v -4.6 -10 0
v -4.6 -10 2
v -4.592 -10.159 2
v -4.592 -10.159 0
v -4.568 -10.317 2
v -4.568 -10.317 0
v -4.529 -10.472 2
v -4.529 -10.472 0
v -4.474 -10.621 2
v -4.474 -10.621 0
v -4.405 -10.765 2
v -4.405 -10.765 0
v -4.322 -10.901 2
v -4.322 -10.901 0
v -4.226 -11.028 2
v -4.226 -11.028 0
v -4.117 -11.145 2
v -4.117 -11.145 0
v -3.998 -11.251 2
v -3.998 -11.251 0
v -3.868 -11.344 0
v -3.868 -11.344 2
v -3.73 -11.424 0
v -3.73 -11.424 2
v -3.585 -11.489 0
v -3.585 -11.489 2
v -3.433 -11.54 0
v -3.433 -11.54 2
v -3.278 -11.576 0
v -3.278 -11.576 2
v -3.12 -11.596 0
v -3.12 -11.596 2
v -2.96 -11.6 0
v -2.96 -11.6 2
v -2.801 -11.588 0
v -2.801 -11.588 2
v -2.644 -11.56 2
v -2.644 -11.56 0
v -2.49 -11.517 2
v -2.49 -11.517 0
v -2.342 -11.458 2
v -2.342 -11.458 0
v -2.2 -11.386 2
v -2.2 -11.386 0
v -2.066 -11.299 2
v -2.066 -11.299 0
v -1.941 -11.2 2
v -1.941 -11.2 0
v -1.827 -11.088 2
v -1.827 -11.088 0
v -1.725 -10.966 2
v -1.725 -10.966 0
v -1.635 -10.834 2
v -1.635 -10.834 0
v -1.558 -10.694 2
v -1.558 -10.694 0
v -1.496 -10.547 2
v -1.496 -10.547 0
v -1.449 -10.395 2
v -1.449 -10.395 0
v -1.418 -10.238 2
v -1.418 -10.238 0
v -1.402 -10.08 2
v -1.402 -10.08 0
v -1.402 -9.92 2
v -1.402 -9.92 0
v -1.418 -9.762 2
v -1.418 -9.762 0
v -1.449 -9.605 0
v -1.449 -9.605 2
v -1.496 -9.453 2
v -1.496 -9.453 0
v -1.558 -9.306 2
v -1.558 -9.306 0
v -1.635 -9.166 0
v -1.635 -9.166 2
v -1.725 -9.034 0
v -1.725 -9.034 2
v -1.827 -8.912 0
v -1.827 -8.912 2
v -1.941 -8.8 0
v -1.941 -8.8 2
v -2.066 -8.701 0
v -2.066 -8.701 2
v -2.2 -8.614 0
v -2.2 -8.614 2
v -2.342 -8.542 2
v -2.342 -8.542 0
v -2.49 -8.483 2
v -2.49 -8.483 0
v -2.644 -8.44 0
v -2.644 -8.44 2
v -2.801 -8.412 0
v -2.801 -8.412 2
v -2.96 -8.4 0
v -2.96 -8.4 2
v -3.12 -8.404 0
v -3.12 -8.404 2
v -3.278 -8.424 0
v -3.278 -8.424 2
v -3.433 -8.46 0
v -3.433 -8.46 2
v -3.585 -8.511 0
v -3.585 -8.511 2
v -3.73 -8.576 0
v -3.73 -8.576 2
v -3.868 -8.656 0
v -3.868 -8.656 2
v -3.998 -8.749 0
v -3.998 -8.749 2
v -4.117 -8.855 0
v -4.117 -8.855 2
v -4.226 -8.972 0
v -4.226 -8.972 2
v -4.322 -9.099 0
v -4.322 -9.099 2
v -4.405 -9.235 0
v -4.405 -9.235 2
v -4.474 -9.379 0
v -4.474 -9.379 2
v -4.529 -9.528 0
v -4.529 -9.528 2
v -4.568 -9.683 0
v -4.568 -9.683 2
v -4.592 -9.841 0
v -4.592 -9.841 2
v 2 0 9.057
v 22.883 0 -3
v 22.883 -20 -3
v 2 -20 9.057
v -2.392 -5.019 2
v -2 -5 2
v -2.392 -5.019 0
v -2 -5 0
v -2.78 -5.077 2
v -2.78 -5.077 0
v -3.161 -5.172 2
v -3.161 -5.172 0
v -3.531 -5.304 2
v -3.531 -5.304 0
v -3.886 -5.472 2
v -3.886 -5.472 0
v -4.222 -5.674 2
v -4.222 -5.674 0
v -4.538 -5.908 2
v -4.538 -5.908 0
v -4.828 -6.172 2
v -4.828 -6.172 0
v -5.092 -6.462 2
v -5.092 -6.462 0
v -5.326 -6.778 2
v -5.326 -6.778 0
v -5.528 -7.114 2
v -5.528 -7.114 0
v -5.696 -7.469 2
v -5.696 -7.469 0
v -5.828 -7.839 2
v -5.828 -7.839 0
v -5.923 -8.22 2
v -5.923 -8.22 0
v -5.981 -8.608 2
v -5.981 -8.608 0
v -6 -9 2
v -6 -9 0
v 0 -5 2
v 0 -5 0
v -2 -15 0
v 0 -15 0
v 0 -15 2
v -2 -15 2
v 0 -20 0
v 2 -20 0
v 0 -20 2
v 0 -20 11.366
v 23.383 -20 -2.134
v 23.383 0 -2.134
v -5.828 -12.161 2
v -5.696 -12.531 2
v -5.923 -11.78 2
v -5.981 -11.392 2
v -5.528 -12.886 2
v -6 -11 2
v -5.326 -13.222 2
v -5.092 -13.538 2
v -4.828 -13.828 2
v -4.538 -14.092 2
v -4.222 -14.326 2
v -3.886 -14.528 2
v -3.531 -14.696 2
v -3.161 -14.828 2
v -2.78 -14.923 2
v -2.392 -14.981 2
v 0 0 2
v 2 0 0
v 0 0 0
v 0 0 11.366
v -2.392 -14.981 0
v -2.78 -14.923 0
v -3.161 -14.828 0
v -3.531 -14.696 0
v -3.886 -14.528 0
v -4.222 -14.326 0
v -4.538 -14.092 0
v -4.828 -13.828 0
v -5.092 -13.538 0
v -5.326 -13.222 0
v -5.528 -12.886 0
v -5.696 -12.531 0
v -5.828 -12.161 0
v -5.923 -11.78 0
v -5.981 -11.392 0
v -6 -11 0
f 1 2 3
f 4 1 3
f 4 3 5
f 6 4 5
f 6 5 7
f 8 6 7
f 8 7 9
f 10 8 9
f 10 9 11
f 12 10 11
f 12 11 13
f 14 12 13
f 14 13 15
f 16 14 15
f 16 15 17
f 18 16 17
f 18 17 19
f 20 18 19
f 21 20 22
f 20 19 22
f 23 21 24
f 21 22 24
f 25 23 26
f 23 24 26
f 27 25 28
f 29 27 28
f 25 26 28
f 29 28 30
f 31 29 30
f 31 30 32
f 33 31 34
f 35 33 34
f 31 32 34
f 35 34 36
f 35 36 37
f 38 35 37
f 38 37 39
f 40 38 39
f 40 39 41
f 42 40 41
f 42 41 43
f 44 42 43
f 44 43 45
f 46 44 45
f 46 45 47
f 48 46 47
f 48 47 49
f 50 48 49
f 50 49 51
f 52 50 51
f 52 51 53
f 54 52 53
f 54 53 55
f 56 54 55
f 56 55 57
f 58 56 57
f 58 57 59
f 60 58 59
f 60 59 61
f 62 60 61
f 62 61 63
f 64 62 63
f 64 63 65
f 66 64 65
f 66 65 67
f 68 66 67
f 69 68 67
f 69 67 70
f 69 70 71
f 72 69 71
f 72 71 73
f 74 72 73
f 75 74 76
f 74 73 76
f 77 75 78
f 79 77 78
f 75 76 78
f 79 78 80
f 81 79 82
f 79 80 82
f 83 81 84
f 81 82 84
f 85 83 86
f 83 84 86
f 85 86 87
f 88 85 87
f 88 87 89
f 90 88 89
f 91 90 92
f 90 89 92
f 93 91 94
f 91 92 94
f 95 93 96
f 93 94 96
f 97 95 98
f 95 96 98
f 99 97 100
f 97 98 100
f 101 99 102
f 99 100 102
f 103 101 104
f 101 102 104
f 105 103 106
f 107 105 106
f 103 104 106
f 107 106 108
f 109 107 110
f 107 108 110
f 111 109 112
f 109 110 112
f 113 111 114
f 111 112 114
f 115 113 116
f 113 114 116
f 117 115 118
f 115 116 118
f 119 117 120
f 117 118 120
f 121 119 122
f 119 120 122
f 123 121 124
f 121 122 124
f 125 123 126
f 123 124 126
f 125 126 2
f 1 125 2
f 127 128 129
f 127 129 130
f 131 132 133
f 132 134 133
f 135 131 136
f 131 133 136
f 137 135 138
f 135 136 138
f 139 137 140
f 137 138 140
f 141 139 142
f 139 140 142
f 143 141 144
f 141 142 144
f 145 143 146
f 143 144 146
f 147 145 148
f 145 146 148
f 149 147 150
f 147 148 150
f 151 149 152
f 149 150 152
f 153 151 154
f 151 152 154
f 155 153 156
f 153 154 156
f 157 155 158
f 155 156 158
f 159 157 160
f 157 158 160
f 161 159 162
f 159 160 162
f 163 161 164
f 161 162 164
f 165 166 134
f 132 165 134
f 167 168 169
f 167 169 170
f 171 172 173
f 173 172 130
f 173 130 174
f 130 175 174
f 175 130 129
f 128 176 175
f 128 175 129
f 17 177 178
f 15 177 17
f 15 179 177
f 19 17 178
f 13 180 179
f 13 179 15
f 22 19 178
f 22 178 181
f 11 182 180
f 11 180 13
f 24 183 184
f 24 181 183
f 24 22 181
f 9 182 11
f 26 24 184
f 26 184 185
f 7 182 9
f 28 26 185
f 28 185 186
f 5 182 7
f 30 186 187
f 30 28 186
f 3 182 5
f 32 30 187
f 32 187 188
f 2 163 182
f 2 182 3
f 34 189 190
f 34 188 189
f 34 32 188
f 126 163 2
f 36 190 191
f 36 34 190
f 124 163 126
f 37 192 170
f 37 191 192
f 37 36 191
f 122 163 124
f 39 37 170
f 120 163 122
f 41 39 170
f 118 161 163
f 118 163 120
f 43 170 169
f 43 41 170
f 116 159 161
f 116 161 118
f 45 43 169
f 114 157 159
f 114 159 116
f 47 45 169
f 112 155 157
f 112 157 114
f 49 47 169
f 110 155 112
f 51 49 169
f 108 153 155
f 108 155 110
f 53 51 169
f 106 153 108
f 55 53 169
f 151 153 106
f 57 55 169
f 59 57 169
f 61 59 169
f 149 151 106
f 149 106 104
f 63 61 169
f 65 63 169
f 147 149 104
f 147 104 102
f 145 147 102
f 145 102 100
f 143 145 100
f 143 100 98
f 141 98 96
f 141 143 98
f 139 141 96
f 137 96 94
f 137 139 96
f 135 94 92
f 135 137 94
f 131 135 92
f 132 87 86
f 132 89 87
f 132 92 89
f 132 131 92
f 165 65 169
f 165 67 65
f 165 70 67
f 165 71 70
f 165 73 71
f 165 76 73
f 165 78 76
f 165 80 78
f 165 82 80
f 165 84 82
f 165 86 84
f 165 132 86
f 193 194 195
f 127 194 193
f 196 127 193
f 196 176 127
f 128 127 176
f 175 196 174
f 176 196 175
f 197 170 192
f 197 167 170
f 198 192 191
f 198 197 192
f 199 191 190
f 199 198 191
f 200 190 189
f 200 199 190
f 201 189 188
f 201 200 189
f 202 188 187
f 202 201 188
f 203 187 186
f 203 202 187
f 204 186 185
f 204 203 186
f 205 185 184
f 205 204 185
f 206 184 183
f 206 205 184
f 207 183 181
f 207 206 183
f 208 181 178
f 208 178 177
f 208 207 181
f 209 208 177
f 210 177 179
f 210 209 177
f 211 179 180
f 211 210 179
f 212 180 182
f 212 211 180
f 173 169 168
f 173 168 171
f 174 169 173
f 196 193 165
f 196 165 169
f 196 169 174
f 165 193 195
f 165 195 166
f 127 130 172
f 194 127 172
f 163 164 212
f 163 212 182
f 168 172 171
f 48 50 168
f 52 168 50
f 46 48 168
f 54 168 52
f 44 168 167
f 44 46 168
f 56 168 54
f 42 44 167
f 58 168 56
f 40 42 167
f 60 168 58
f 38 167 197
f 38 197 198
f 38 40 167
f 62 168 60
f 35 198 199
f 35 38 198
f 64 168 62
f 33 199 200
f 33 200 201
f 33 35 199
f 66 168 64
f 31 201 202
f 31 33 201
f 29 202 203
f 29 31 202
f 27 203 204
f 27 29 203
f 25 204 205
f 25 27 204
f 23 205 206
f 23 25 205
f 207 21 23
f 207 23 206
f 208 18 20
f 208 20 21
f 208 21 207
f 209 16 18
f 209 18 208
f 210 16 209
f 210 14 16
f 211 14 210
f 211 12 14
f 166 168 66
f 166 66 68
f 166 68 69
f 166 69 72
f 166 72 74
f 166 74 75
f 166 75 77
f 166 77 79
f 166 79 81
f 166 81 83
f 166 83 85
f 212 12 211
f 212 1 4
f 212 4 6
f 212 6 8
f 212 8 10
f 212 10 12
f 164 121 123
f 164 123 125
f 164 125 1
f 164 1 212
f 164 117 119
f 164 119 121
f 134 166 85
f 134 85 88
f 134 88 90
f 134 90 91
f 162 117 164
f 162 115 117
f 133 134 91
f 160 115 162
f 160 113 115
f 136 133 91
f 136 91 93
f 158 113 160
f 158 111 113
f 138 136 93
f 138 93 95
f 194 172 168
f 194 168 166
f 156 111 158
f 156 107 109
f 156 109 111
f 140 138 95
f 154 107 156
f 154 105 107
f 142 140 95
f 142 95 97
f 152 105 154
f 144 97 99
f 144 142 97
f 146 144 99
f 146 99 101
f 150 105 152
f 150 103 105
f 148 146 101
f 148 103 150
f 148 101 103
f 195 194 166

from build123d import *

# Parameters (mm, degrees)
PAD_DEPTH     = 20
SKETCH001_R   = 1.6
SKETCH001_W   = 8.873669
SKETCH001_H   = 5
SKETCH001_W_2 = 10.362093
POCKET_DEPTH  = 5
FILLET_R      = 4


with BuildPart() as part:
    # Sketch → Pad (new body)
    with BuildSketch(Plane.XZ):
        Polygon((0, 11.366025), (23.382686, -2.133975), (22.882686, -3), (2, 9.056624), (2, 0), (-6, 0), (-6, 2), (0, 2), align=None)
    extrude(amount=PAD_DEPTH)

    # Sketch001 (on Face7 of Pad) → Pocket (cut)
    with BuildSketch(Plane(origin=(0, 0, 2), x_dir=(-1, 0, 0), z_dir=(0, 0, 1))):
        with Locations((3, 10)):
            Circle(SKETCH001_R)
        with Locations((4.436834, 2.5)):
            Rectangle(SKETCH001_W, SKETCH001_H)
        with Locations((5.181046, 17.5)):
            Rectangle(SKETCH001_W_2, SKETCH001_H)
    extrude(amount=-POCKET_DEPTH, mode=Mode.SUBTRACT)

    # Fillet
    fillet_edges = [part.edges().sort_by_distance(p)[0] for p in [
        (-6, -5, 1),
        (-6, -15, 1),
    ]]
    fillet(fillet_edges, radius=FILLET_R)


solid = part.part
